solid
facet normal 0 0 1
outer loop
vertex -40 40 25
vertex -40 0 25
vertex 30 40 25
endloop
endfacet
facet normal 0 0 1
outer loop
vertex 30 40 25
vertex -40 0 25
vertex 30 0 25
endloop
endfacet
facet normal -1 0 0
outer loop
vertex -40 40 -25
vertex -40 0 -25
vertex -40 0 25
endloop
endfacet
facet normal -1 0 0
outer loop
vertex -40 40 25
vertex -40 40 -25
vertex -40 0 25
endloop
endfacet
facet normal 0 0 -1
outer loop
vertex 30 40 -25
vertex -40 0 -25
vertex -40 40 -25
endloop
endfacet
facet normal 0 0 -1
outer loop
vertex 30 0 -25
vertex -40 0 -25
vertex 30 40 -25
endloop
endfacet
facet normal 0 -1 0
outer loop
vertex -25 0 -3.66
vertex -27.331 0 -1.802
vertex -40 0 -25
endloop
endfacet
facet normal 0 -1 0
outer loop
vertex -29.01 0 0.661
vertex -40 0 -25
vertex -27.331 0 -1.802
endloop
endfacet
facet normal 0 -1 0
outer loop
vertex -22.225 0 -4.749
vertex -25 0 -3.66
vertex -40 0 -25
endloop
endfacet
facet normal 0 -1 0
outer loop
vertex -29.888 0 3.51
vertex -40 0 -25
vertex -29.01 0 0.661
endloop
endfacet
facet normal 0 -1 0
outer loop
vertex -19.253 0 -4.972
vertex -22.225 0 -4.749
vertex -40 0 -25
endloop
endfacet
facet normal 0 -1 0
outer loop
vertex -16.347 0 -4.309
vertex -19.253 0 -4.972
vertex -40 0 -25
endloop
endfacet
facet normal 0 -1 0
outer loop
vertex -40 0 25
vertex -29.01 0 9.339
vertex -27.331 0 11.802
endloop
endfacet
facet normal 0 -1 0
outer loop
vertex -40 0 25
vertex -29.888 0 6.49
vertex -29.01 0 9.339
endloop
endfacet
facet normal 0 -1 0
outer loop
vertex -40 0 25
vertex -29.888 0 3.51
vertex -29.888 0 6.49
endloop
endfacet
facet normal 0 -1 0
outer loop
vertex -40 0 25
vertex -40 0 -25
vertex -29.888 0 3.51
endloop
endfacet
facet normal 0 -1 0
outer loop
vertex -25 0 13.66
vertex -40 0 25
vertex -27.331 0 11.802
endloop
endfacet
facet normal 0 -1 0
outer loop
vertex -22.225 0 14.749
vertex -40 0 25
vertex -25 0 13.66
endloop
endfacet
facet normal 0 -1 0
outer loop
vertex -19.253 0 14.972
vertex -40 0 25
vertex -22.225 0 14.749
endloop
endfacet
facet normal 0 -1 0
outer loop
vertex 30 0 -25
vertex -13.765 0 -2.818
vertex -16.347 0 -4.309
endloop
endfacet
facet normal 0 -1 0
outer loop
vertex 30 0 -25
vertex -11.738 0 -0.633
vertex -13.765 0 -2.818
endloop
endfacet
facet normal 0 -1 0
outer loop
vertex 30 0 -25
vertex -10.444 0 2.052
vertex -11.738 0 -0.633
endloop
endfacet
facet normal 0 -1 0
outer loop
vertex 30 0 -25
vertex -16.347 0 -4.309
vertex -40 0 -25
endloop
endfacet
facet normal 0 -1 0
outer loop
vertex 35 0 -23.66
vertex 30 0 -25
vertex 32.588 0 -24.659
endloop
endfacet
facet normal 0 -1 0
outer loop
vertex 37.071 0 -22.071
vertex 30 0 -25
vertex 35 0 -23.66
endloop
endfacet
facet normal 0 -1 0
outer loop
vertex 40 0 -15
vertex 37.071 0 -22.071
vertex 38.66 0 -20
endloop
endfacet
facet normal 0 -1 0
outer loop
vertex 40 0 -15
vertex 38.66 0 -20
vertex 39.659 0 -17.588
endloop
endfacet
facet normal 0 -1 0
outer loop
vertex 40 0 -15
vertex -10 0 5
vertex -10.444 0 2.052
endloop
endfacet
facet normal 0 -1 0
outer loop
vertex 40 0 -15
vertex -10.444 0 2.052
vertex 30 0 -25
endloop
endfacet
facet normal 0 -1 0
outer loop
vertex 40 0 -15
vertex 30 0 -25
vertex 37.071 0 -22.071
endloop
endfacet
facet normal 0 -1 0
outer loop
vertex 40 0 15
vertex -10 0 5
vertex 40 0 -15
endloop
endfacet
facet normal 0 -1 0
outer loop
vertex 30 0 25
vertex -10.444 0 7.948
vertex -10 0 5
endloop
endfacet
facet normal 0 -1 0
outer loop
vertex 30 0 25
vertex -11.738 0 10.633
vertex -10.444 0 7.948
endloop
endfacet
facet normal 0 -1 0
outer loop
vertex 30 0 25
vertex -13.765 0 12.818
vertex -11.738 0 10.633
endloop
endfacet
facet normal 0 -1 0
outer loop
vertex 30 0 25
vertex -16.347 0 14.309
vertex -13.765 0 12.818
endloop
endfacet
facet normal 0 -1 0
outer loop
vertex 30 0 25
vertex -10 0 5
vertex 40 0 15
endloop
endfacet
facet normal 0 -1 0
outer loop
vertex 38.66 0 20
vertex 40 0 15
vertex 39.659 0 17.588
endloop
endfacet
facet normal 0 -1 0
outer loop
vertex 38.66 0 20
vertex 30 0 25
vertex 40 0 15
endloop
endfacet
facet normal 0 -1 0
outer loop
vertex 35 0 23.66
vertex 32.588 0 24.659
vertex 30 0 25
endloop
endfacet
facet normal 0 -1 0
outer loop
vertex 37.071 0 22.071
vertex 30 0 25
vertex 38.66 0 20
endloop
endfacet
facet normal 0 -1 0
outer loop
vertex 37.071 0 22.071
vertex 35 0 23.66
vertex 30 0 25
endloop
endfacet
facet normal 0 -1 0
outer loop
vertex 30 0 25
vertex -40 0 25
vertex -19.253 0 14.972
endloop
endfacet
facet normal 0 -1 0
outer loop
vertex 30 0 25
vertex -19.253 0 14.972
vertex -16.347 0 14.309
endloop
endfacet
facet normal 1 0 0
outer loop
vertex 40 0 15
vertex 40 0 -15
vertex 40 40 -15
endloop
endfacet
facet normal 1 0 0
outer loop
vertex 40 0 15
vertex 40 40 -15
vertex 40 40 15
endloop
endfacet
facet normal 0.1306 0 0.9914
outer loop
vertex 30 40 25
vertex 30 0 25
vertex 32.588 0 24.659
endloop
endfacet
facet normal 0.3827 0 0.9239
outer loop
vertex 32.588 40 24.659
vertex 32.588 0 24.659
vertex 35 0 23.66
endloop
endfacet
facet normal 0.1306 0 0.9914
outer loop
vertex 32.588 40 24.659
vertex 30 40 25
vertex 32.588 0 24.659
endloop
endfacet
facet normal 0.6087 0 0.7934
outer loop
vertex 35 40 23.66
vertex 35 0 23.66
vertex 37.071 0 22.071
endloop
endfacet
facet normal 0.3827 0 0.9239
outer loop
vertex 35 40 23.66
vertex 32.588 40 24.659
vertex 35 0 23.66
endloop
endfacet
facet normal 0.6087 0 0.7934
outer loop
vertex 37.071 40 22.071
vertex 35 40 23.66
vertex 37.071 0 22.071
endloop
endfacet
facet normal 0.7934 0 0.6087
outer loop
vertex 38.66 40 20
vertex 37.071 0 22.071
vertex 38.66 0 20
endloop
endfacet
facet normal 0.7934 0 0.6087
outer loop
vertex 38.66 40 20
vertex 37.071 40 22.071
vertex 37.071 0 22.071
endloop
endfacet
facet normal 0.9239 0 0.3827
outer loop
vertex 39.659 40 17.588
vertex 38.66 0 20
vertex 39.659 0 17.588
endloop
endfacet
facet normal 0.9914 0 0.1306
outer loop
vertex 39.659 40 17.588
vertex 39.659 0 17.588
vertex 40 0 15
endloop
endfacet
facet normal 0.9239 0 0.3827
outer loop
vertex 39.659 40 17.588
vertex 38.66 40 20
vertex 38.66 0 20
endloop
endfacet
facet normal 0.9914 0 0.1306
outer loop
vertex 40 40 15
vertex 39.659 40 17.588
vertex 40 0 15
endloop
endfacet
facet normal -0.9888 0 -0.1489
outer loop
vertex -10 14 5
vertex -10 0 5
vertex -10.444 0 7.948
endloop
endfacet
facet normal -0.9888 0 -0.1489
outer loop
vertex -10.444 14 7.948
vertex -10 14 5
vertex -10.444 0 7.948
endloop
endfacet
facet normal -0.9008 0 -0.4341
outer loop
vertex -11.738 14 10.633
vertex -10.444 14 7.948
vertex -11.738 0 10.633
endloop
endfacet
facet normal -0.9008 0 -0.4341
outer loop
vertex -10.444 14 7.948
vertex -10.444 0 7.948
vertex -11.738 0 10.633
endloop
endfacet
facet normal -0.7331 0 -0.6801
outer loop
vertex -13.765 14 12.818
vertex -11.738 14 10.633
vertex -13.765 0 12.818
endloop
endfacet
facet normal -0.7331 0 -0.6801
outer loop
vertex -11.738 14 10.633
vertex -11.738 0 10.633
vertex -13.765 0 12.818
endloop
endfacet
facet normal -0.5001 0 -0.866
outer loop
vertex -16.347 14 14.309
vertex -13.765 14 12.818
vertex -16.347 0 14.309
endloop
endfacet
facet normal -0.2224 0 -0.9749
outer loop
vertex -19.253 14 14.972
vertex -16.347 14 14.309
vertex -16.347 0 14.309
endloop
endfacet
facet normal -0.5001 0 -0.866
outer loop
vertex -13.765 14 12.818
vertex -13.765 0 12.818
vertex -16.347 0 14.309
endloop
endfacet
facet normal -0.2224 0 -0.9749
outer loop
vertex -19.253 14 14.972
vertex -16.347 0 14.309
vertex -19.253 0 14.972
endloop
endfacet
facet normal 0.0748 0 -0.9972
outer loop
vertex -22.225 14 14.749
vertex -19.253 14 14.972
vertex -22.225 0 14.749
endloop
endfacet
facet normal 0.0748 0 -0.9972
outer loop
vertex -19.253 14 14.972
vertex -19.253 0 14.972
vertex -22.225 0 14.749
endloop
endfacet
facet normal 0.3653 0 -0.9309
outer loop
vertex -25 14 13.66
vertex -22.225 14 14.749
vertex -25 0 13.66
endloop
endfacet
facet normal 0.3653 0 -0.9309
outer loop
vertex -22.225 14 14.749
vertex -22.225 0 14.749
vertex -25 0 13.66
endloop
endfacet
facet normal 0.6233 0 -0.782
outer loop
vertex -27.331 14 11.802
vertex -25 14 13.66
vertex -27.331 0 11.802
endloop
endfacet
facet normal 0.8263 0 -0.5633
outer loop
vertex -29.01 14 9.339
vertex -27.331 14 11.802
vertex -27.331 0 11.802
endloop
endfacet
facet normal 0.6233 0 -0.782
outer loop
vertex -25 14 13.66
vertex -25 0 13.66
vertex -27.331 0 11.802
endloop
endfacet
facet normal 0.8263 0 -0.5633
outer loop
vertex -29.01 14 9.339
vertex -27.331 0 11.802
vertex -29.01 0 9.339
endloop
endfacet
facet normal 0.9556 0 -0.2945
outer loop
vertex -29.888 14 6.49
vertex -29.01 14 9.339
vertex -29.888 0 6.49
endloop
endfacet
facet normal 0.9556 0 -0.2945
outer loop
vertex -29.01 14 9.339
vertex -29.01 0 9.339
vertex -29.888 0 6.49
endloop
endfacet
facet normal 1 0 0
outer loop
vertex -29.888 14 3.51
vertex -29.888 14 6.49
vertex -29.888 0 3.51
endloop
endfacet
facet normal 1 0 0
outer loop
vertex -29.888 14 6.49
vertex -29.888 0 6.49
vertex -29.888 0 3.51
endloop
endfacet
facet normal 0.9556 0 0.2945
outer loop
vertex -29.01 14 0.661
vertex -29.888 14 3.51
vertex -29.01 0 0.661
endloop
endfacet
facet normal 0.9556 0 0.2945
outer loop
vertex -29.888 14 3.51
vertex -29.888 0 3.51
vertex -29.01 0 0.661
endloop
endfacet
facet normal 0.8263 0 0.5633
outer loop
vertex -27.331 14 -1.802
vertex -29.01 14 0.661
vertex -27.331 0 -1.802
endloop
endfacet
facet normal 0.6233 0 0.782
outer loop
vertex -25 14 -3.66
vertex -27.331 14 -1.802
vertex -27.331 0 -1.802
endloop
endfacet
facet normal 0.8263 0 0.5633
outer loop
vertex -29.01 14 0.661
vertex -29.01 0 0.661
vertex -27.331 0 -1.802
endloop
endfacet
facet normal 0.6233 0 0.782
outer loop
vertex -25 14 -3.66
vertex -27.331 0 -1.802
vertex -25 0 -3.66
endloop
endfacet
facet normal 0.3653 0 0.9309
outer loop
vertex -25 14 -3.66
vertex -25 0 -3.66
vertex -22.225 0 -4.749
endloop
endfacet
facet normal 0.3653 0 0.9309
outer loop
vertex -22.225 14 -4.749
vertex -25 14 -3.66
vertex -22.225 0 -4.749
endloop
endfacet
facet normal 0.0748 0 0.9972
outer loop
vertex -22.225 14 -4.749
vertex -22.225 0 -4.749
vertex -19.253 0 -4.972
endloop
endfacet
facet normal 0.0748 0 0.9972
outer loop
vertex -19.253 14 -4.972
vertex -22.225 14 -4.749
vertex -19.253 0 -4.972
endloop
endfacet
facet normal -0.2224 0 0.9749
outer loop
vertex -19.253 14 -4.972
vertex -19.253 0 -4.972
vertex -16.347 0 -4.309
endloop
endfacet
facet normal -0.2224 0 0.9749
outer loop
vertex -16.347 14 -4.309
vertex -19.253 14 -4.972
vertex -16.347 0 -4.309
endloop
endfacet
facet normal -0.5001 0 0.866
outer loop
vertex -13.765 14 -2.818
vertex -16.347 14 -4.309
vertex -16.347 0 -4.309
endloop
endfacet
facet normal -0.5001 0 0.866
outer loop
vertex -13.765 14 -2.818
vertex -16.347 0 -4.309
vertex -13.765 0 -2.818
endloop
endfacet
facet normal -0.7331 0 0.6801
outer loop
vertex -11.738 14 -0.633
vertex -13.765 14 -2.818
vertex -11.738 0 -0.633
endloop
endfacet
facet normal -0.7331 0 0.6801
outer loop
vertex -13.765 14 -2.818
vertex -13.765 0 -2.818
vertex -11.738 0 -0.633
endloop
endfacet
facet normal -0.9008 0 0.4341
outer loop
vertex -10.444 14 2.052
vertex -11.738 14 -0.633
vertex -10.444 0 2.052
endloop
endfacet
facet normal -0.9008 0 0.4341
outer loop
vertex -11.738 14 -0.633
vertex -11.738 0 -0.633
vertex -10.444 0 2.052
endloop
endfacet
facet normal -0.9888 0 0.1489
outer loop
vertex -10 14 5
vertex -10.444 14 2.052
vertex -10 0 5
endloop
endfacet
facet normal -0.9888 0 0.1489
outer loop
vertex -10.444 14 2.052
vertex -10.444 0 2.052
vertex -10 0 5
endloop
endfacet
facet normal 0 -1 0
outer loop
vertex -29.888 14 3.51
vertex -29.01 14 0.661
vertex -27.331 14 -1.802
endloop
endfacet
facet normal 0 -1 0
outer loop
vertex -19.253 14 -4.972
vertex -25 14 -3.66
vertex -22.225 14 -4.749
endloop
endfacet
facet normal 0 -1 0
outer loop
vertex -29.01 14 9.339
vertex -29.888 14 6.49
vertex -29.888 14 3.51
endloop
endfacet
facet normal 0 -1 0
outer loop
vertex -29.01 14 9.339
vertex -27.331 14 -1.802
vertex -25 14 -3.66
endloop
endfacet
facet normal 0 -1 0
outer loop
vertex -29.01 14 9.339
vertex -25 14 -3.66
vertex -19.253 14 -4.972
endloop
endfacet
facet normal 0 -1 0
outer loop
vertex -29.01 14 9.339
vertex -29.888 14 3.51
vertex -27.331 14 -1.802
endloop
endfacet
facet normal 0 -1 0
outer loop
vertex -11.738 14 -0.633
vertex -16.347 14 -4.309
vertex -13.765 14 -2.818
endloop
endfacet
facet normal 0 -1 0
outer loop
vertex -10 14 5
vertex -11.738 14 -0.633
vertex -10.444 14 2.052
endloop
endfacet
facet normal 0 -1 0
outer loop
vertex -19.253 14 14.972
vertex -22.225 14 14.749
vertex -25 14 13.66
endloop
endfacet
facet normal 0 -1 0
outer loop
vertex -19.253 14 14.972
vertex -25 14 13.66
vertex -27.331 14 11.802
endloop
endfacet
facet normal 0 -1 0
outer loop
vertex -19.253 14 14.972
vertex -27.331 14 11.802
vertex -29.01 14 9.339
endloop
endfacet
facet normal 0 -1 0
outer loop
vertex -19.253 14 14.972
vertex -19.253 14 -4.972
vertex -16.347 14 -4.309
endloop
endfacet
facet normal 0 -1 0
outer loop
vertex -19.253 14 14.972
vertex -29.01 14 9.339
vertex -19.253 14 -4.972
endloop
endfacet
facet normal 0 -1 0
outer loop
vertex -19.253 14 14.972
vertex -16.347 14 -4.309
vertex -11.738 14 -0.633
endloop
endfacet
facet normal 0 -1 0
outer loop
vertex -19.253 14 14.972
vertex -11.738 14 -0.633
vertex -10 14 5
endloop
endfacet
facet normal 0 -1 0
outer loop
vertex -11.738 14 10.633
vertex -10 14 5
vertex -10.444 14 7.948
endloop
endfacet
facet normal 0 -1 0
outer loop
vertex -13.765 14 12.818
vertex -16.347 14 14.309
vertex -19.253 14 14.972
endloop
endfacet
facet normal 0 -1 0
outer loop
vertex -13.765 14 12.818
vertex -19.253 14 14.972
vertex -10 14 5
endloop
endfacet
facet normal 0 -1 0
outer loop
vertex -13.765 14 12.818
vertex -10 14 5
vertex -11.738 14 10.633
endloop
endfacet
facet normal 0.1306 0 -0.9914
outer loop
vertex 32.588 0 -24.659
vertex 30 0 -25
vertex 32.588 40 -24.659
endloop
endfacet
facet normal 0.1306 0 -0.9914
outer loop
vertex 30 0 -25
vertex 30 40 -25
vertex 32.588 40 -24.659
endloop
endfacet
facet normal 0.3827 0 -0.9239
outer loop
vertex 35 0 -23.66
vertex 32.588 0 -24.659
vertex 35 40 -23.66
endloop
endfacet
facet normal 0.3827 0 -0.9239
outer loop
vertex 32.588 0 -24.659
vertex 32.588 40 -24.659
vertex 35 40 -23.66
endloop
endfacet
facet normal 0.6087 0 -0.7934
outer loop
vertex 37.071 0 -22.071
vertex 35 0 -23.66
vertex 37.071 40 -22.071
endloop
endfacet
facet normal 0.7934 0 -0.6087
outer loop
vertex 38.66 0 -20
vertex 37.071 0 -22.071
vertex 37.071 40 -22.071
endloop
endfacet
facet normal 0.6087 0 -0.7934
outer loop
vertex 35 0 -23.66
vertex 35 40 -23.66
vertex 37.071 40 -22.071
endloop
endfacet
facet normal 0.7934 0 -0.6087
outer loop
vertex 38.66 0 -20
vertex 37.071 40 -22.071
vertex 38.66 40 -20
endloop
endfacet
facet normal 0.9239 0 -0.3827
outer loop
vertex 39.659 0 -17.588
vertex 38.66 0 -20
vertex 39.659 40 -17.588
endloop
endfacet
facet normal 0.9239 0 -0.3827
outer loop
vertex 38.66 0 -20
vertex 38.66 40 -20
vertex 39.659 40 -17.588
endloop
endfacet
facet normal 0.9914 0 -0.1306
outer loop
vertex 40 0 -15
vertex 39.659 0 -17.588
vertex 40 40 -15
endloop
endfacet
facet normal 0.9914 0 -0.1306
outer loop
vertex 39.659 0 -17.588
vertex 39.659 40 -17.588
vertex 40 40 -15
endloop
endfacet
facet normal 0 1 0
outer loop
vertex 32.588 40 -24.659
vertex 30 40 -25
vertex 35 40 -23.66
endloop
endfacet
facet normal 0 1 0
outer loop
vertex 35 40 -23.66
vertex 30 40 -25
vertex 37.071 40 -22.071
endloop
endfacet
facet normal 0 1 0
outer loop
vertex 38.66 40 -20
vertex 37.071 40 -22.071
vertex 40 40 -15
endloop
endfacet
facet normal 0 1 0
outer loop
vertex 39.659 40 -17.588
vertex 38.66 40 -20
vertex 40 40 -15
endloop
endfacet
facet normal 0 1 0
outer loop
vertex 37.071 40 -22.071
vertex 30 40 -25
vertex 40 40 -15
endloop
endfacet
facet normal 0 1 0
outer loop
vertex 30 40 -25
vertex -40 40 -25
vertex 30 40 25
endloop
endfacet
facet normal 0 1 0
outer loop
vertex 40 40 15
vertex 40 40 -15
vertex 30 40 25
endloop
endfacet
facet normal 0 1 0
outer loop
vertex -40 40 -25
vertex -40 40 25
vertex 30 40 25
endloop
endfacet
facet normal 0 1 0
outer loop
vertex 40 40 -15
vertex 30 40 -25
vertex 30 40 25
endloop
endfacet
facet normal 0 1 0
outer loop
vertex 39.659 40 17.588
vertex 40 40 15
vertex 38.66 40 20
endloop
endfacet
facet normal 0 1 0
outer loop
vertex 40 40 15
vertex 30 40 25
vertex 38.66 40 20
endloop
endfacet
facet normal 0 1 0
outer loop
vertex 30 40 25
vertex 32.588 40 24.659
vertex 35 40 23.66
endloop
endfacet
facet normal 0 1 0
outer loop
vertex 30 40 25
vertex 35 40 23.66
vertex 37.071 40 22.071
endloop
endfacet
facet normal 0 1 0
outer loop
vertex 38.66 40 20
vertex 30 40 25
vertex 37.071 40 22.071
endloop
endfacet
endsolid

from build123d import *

# Parameters (mm, degrees)
SKETCH_W     = 80
SKETCH_H     = 50
PAD_DEPTH    = 40
SKETCH001_R  = 10
POCKET_DEPTH = 14
FILLET_R     = 10


with BuildPart() as part:
    # Sketch → Pad (new body)
    with BuildSketch(Plane.XZ):
        Rectangle(SKETCH_W, SKETCH_H)
    extrude(amount=-PAD_DEPTH)

    # Sketch001 → Pocket (cut)
    with BuildSketch(Plane.XZ):
        with Locations((-20, 5)):
            Circle(SKETCH001_R)
    extrude(amount=-POCKET_DEPTH, mode=Mode.SUBTRACT)

    # Fillet
    fillet_edges = [part.edges().sort_by_distance(p)[0] for p in [
        (40, 20, 25),
        (40, 20, -25),
    ]]
    fillet(fillet_edges, radius=FILLET_R)


solid = part.part
